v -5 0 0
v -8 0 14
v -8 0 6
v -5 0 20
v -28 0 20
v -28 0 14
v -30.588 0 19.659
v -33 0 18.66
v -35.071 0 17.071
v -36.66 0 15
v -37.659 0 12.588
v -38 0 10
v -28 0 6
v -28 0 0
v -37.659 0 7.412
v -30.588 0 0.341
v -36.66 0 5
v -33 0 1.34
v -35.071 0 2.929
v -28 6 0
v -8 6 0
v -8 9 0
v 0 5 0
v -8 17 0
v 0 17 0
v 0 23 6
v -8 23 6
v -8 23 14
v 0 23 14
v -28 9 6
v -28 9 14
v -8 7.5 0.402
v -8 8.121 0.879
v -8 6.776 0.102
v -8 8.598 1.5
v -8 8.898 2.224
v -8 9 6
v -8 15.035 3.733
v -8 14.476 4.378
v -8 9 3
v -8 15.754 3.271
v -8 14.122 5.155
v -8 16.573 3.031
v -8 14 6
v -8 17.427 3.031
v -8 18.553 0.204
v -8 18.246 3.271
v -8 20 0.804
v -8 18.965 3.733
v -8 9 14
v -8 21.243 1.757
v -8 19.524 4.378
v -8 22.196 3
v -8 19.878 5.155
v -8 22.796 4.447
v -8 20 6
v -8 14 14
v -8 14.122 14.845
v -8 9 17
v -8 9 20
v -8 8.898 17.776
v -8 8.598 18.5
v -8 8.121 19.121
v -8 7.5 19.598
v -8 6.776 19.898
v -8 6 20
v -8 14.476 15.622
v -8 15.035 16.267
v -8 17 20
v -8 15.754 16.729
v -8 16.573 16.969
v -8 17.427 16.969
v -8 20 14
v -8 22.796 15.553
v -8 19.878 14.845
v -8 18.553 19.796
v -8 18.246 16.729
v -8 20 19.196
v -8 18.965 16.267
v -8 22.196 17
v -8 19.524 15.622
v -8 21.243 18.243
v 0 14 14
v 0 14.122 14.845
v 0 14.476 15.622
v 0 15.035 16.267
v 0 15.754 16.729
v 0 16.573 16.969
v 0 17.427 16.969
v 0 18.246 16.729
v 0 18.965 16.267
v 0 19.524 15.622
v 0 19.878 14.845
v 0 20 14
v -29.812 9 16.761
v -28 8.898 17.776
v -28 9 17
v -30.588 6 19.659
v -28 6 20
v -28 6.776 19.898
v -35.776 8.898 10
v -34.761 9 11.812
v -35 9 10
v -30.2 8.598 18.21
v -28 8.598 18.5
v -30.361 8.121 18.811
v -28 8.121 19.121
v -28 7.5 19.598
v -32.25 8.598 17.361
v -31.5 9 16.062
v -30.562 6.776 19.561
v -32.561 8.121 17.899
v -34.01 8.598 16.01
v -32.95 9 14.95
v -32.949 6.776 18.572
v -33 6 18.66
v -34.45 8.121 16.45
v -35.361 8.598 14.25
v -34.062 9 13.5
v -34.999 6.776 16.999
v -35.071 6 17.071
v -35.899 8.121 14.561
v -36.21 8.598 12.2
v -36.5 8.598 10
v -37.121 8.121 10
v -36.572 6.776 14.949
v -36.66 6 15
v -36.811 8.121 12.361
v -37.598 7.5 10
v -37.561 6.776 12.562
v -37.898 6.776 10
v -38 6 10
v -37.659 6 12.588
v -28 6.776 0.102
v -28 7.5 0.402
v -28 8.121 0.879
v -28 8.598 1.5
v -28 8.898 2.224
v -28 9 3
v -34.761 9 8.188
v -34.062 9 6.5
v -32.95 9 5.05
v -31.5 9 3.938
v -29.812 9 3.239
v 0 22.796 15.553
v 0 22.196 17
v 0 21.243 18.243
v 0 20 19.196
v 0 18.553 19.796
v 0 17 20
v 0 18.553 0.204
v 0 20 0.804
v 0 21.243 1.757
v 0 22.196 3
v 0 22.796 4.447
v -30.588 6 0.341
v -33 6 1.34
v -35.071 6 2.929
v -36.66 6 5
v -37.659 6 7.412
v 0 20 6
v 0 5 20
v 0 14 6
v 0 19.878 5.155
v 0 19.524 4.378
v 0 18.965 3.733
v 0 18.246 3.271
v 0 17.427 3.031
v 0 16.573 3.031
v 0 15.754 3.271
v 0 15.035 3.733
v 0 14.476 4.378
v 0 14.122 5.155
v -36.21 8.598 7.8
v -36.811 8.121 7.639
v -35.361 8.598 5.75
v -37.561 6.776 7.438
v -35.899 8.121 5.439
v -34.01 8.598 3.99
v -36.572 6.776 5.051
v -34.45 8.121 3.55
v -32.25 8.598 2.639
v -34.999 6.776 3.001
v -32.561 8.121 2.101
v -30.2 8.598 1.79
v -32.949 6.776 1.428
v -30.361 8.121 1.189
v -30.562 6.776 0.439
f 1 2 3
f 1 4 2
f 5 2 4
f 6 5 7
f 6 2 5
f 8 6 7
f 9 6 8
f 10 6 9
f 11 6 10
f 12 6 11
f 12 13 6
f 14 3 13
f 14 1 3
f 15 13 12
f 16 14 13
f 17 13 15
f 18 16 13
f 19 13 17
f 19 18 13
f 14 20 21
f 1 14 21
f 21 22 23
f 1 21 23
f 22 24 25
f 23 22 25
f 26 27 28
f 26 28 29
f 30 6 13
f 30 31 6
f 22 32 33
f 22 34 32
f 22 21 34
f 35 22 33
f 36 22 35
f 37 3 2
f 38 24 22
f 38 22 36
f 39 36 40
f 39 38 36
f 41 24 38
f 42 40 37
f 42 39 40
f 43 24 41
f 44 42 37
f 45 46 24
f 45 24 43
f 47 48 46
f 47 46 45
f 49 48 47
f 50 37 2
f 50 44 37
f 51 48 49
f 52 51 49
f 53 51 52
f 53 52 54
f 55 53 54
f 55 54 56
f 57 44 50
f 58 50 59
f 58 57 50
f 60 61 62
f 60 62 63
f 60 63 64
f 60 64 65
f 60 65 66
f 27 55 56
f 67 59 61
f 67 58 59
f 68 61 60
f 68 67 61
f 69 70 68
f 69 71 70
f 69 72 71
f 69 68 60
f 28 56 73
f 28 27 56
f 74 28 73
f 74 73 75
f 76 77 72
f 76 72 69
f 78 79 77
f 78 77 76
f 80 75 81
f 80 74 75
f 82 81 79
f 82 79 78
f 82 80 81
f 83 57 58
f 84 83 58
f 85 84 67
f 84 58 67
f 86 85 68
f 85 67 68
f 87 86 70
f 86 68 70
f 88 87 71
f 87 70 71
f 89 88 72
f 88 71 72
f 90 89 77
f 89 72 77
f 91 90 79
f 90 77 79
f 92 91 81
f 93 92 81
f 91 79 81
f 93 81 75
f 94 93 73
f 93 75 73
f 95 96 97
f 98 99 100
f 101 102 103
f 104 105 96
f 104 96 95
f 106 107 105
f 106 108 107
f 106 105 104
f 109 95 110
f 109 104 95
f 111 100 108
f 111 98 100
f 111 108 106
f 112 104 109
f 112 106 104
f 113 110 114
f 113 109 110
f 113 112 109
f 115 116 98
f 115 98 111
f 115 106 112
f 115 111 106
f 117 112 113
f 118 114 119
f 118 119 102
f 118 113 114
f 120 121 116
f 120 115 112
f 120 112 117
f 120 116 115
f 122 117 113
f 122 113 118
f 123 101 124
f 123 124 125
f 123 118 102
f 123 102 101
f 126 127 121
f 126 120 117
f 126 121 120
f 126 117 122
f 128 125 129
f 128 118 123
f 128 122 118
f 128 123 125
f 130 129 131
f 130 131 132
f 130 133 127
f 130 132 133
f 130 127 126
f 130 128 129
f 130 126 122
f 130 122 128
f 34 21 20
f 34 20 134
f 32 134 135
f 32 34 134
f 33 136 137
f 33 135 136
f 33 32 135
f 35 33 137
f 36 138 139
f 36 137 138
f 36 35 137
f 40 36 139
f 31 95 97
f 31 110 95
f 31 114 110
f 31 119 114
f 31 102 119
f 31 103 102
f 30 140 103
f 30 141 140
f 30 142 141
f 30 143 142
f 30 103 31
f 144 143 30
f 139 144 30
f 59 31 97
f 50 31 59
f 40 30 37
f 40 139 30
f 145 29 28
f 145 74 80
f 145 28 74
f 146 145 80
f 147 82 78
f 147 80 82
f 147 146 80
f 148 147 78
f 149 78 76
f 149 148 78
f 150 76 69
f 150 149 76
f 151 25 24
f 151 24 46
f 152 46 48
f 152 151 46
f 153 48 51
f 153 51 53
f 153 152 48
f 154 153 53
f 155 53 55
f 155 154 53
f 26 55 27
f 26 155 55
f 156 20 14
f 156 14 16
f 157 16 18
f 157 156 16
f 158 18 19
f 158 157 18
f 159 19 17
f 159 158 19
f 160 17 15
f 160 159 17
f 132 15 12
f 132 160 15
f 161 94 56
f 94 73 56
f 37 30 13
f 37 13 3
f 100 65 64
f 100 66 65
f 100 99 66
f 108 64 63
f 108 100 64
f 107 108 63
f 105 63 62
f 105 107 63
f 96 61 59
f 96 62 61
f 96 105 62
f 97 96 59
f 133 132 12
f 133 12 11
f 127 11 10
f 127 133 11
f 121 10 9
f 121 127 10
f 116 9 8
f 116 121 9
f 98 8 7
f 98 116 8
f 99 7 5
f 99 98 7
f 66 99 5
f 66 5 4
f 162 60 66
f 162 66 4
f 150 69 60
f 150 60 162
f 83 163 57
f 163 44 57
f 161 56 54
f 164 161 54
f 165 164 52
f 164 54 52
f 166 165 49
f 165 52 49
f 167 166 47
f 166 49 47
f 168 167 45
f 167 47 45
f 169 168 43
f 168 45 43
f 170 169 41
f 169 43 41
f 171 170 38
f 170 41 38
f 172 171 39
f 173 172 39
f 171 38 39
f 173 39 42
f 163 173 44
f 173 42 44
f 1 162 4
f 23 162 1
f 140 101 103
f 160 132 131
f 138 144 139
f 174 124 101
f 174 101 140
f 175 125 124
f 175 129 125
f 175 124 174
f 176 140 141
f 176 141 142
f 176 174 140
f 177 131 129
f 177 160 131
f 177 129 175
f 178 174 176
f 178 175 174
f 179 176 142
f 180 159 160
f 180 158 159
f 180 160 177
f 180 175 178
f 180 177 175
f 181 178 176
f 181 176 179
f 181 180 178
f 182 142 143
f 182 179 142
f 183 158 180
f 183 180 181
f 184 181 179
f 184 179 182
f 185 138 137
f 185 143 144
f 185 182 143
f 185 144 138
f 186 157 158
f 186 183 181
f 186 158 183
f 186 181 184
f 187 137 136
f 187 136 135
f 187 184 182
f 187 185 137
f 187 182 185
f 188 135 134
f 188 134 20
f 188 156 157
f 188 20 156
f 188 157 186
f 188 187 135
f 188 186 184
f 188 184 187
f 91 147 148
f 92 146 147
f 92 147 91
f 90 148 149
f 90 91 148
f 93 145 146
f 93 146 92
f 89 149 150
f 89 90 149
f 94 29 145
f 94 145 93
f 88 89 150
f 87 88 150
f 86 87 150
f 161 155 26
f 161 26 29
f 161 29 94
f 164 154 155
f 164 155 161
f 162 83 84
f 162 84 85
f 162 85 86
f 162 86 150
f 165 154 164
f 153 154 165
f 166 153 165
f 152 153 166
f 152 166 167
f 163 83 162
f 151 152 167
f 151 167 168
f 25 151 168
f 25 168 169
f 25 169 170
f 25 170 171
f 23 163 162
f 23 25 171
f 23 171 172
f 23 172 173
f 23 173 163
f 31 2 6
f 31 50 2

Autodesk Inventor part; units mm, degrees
ref_plane "YZ Plane" through (0, 0, 0) normal (1, 0, 0) x (0, 1, 0)
ref_plane "XZ Plane" through (0, 0, 0) normal (0, 1, 0) x (-1, 0, 0)
ref_plane "XY Plane" through (0, 0, 0) normal (0, 0, 1) x (1, 0, 0)
sketch "스케치1" plane through (0, 0, 0) normal (0, 0, 1) x (1, 0, 0)
  point P0 (0, 0)
sketch "스케치2" plane through (0, 0, 0) normal (0, 0, 1) x (1, 0, 0)
  point P0 (0, 0)
sketch "스케치3" plane through (0, 0, 0) normal (0, 0, 1) x (1, 0, 0)
  point P0 (0, 0)
sketch "스케치4" plane through (0, 0, 0) normal (0, 0, 1) x (1, 0, 0)
  line L0 (0, 0) -> (-38, 0)
  line L1 (-38, 0) -> (-38, 9)
  line L2 (-38, 9) -> (-8, 9)
  line L3 (-8, 9) -> (-8, 23)
  line L4 (-8, 23) -> (0, 23)
  line L5 (0, 23) -> (0, 0)
  dimension "d2" = 38
  dimension "d3" = 9
  dimension "d6" = 8
  dimension "d7" = 23
sketch "스케치5" plane through (0, 0, 0) normal (0, 0, 1) x (1, 0, 0)
  point P0 (0, 0)
extrude "돌출1" add sketch "스케치4" along normal blind 20
sketch "스케치6" plane through (-38, 9, 0) normal (0, 1, 0) x (1, 0, 0)
  point P0 (38, 0)
sketch "스케치7" plane through (-38, 9, 0) normal (0, 1, 0) x (1, 0, 0)
  line L0 (30, 0) -> (30, -20) projected
  line L1 (30, -14) -> (10, -14)
  line L2 (10, -14) -> (10, -6)
  line L3 (10, -6) -> (30, -6)
  line L4 (30, -6) -> (30, -14)
  line L5 (30, -20) -> (0, -20) projected
  line L6 (30, -6) -> (30, -14)
  line L7 (30, -6) -> (30, -14)
  line L8 (30, -14) -> (30, -6)
  line L9 (30, -14) -> (30, -6)
  point P0 (38, 0)
  dimension "d10" = 20
  dimension "d11" = 8
  dimension "d12" = 6
extrude "돌출2" cut sketch "스케치7" against normal blind 10
fillet "모깎기1" radius 10 2 edges at (-38, 4.5, 20) (-38, 4.5, 0)
fillet "모깎기2" radius 6 2 edges at (-4, 23, 20) (-4, 23, 0)
sketch "스케치8" plane through (-8, 0, 6) normal (-1, 0, 0) x (0, 0, 1)
  point P0 (-6, 0)
sketch "스케치9" plane through (-8, 0, 6) normal (-1, 0, 0) x (0, 0, 1)
  point P0 (-6, 0)
sketch "스케치10" plane through (-8, 0, 6) normal (-1, 0, 0) x (0, 0, 1)
  line L0 (0, 9) -> (0, 0) projected
  line L1 (8, 9) -> (8, 0) projected
  line L2 (0, 9) -> (8, 9)
  line L3 (-6, 9) -> (14, 9) projected
  line L4 (8, 9) -> (14, 9)
  line L5 (0, 9) -> (0, 0) projected
  point P0 (-6, 0)
sketch "스케치11" plane through (-8, 0, 6) normal (-1, 0, 0) x (0, 0, 1)
  line L0 (8, 9) -> (0, 9) projected
  line L1 (-6, 9) -> (0, 9) projected
  line L2 (0, 9) -> (-6, 9)
  point P0 (-6, 0)
sketch "스케치12" plane through (-8, 0, 6) normal (-1, 0, 0) x (0, 0, 1)
  line L0 (0, 17) -> (8, 17) construction
  line L1 (0, 14) -> (8, 14)
  line L2 (8, 20) -> (0, 20)
  arc A0 (0, 20) -> (0, 14) centre (0, 17) ccw
  arc A1 (8, 14) -> (8, 20) centre (8, 17) ccw
  line L3 (-6, 17) -> (-6, 9) projected
  line L4 (14, 0) -> (-6, 0) projected
  point P0 (4, 17)
  dimension "d18" = 8
  dimension "d19" = 6
  dimension "d20" = 10
  dimension "d21" = 17
sketch "스케치13" plane through (-8, 0, 6) normal (-1, 0, 0) x (0, 0, 1)
  point P0 (-6, 0)
extrude "돌출3" cut sketch "스케치12" against normal blind 10
fillet "모깎기3" radius 3 3 edges at (-35.0711, 9, 17.0711) (-18.0001, 9, 20) (-18.0001, 9, 0)
chamfer "모따기1" distance 5 angle 45 1 edges at (0, 0, 10)
properties part number "01_01"
